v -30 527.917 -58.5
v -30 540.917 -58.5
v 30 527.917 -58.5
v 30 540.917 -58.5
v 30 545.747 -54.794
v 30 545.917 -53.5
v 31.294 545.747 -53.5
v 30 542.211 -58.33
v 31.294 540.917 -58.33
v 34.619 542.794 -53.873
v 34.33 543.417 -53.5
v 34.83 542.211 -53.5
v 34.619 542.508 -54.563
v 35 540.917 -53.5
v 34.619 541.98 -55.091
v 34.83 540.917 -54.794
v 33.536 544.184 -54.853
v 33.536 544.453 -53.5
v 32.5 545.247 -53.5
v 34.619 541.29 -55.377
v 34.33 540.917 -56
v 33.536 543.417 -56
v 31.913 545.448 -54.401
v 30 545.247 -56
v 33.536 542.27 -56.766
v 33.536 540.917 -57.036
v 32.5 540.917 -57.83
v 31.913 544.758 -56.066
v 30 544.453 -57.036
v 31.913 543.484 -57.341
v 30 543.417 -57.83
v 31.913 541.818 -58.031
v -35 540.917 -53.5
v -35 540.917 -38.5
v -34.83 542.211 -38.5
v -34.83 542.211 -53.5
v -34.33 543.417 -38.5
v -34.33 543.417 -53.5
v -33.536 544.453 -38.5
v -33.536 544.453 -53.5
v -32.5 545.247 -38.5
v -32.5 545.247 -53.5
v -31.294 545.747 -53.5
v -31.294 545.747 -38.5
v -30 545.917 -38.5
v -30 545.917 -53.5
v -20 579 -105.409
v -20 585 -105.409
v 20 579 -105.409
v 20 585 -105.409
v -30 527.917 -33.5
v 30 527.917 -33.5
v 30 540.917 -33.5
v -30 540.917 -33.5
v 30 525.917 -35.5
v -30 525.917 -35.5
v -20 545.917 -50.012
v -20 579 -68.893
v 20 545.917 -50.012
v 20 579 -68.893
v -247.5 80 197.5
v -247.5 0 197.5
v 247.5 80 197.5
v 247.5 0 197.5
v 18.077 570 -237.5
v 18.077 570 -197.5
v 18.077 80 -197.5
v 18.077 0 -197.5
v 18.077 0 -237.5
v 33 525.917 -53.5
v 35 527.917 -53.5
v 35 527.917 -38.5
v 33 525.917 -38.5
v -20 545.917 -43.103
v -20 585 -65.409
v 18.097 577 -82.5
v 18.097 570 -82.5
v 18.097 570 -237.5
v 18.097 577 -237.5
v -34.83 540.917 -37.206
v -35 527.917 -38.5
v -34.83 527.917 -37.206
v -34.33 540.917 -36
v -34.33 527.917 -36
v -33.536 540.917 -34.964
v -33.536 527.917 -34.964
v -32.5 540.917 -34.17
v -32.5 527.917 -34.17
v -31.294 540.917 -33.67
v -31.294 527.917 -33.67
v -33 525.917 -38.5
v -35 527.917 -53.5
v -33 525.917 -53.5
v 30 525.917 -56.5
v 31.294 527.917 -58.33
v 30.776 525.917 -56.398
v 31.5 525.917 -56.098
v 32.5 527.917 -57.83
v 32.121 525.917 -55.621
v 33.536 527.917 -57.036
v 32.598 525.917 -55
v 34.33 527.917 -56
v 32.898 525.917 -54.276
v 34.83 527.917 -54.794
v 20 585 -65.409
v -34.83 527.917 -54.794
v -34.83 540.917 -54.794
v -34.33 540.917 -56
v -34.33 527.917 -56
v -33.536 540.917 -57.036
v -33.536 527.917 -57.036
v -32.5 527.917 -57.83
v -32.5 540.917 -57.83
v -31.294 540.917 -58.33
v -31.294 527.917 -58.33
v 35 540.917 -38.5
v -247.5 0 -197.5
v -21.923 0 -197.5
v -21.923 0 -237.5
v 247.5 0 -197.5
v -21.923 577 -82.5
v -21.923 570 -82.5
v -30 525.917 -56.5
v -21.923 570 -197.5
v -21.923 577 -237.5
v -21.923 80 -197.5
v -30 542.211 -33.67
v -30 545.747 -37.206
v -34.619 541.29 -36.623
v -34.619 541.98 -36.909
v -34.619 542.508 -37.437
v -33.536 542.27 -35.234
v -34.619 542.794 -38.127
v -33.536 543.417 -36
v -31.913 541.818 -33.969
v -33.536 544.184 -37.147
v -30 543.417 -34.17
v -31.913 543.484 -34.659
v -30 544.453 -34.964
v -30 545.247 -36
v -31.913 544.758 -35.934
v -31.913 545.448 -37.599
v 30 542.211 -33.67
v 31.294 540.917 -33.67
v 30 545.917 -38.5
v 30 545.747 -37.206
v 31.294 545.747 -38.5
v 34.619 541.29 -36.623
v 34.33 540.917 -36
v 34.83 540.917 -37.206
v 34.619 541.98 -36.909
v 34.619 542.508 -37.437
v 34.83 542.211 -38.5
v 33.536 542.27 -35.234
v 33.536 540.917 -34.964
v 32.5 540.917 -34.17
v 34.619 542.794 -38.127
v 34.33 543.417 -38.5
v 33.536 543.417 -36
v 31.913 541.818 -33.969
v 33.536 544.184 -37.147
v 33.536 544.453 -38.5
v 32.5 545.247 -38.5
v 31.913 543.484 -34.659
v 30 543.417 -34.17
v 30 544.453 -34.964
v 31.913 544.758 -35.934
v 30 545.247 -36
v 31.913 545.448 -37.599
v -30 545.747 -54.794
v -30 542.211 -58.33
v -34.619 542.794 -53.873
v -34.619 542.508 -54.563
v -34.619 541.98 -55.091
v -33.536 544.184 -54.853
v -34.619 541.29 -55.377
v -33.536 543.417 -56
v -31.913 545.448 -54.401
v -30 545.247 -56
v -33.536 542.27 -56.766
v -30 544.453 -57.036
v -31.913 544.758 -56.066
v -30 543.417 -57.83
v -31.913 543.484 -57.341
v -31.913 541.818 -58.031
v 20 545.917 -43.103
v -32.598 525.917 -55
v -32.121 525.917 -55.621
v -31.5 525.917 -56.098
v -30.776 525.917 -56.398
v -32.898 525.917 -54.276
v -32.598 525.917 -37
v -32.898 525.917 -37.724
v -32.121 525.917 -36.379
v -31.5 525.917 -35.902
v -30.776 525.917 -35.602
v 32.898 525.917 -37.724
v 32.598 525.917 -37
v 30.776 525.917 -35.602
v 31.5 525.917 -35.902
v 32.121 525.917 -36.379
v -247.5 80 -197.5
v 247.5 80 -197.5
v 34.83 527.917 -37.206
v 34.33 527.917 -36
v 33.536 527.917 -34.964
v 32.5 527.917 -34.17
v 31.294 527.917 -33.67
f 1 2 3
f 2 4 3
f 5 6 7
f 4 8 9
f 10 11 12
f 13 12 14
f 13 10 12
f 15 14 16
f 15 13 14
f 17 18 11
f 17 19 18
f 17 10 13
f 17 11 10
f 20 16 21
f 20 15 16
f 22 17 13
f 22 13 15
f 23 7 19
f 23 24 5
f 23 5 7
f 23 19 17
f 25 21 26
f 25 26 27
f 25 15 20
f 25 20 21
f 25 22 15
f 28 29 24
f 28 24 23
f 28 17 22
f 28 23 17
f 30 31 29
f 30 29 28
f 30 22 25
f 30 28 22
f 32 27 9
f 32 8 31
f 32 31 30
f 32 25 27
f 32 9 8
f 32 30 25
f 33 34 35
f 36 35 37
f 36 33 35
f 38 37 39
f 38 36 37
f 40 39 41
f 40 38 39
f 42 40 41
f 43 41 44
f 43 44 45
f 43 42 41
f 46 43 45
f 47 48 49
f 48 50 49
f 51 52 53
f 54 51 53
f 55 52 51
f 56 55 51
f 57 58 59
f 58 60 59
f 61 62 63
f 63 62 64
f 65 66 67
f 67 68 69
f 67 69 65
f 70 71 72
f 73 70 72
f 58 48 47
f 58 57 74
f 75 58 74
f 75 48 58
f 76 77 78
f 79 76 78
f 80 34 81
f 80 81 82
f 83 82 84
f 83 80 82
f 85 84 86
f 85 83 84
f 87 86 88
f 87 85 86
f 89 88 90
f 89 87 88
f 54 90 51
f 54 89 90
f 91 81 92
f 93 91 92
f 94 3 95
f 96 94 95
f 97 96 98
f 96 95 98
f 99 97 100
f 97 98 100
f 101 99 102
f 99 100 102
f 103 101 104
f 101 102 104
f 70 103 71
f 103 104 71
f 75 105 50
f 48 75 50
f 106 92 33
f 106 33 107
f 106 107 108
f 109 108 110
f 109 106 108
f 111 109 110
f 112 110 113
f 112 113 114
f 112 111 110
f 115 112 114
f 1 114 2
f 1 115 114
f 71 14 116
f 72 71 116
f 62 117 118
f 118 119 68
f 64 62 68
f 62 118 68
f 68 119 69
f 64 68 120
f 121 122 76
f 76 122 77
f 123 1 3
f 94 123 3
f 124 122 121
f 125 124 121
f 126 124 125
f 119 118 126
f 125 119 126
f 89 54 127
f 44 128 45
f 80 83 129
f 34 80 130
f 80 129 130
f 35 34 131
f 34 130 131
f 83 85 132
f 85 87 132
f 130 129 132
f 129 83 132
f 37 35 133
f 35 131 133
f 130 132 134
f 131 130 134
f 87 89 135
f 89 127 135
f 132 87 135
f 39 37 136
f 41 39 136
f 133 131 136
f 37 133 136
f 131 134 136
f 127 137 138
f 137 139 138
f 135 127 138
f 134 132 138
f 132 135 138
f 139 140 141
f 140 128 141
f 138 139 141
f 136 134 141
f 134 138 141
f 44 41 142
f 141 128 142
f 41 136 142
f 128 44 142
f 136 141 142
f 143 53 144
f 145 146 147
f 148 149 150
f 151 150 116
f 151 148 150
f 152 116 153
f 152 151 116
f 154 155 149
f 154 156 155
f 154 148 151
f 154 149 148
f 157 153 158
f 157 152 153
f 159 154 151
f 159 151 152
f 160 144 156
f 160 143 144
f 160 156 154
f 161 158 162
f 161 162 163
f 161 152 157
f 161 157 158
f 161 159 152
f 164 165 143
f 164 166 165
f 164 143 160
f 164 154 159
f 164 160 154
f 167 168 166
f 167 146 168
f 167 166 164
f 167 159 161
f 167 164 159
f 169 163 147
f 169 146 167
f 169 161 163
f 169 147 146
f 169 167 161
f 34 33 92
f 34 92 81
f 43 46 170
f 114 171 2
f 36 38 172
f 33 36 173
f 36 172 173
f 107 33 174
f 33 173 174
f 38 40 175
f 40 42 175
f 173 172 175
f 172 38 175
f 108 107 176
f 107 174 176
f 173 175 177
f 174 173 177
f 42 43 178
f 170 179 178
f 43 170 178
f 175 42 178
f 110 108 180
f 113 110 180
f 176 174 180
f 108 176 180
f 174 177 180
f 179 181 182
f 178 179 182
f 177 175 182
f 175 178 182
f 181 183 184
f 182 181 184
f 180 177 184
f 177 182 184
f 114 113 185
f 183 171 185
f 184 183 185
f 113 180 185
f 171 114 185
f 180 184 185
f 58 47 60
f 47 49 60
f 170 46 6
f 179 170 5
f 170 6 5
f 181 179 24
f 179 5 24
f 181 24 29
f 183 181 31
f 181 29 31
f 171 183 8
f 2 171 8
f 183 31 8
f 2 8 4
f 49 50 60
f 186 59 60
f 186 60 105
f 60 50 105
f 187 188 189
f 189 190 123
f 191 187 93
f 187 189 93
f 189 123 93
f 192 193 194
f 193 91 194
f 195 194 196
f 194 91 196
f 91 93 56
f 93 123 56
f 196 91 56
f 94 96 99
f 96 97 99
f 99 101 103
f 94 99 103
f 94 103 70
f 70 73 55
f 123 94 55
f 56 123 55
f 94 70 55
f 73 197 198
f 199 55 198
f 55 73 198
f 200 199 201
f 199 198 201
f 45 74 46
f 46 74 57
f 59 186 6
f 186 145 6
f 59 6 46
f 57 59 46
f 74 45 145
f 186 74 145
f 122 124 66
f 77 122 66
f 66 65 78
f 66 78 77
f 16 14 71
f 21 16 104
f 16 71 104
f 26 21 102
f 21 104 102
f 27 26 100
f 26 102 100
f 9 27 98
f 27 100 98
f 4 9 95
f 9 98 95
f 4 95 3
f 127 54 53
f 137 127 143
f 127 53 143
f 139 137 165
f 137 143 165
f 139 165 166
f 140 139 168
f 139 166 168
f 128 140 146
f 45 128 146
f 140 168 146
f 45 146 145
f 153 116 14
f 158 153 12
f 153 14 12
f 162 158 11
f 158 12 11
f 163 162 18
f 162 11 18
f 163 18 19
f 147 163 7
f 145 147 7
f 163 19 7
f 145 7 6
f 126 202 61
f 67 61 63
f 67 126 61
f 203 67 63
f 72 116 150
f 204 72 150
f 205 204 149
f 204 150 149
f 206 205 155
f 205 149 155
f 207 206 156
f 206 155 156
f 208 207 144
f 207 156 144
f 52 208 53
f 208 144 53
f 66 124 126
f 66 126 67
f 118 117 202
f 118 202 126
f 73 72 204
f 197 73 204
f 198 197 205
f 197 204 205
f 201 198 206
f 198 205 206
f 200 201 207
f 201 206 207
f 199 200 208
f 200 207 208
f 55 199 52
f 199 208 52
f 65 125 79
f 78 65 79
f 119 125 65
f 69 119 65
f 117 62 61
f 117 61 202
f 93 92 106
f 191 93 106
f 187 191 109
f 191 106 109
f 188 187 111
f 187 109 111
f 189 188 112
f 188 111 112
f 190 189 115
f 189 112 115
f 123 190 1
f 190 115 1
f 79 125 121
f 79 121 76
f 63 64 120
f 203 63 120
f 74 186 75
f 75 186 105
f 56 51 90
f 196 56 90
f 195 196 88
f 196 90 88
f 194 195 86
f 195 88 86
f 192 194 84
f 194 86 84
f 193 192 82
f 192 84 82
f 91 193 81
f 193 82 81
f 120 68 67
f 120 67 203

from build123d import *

# Parameters (mm, degrees)
SKETCH1_W           = 495
SKETCH1_H           = 395
BOSS_EXTRUDE1_DEPTH = 80
SKETCH2_W           = 40
SKETCH2_H           = 40
BOSS_EXTRUDE2_DEPTH = 570
SKETCH3_W           = 40.020801558
SKETCH3_H           = 155
BOSS_EXTRUDE3_DEPTH = 7
BOSS_EXTRUDE4_DEPTH = 20
BOSS_EXTRUDE5_DEPTH = 35
FILLET1_R           = 5
CHAMFER1_SIZE       = 2


with BuildPart() as part:
    # Sketch1 → Boss-Extrude1 (new body)
    with BuildSketch(Plane(origin=(0, 0, 0), x_dir=(1, 0, 0), z_dir=(0, 1, 0))):
        Rectangle(SKETCH1_W, SKETCH1_H)
    extrude(amount=BOSS_EXTRUDE1_DEPTH)

    # Sketch2 → Boss-Extrude2 (add)
    with BuildSketch(Plane(origin=(0, 0, 0), x_dir=(1, 0, 0), z_dir=(0, 1, 0))):
        with Locations((-1.923445808, 217.5)):
            Rectangle(SKETCH2_W, SKETCH2_H)
    extrude(amount=BOSS_EXTRUDE2_DEPTH)

    # Sketch3 → Boss-Extrude3 (add)
    with BuildSketch(Plane(origin=(0, 570, 0), x_dir=(1, 0, 0), z_dir=(0, 1, 0))):
        with Locations((-1.913045029, 160)):
            Rectangle(SKETCH3_W, SKETCH3_H)
    extrude(amount=BOSS_EXTRUDE3_DEPTH)


with BuildPart() as body_2:
    # Sketch4 → Boss-Extrude4 (new, symmetric)
    with BuildSketch(Plane(origin=(0, 0, 0), x_dir=(0, 0, -1), z_dir=(1, 0, 0))):
        with BuildLine():
            Line((65.408745176, 585), (105.408745176, 585))
            Line((105.408745176, 585), (105.408745176, 579))
            Line((105.408745176, 579), (68.892810257, 579))
            Line((68.892810257, 579), (50.011654683, 545.91720855))
            Line((50.011654683, 545.91720855), (53.5, 545.91720855))
            ThreePointArc((53.5, 545.91720855), (57.035533906, 544.452742456), (58.5, 540.91720855))
            Line((58.5, 540.91720855), (58.5, 525.91720855))
            Line((58.5, 525.91720855), (33.5, 525.91720855))
            Line((33.5, 525.91720855), (33.5, 540.91720855))
            ThreePointArc((33.5, 540.91720855), (34.964466094, 544.452742456), (38.5, 545.91720855))
            Line((38.5, 545.91720855), (43.103243334, 545.91720855))
            Line((43.103243334, 545.91720855), (65.408745176, 585))
        make_face()
    extrude(amount=BOSS_EXTRUDE4_DEPTH, both=True)

    # Sketch5 → Boss-Extrude5 (add, symmetric)
    with BuildSketch(Plane(origin=(0, 0, 0), x_dir=(0, 0, -1), z_dir=(1, 0, 0))):
        with BuildLine():
            Line((58.5, 525.91720855), (33.5, 525.91720855))
            Line((33.5, 525.91720855), (33.5, 540.91720855))
            ThreePointArc((33.5, 540.91720855), (34.964466094, 544.452742456), (38.5, 545.91720855))
            Line((38.5, 545.91720855), (43.103243334, 545.91720855))
            Line((43.103243334, 545.91720855), (50.011654683, 545.91720855))
            Line((50.011654683, 545.91720855), (53.5, 545.91720855))
            ThreePointArc((53.5, 545.91720855), (57.035533906, 544.452742456), (58.5, 540.91720855))
            Line((58.5, 540.91720855), (58.5, 525.91720855))
        make_face()
    extrude(amount=BOSS_EXTRUDE5_DEPTH, both=True)

    # Fillet1
    fillet1_edges = [body_2.edges().sort_by_distance(p)[0] for p in [
        (-35, 533.41720855, -58.5),
        (-35, 544.452742456, -57.035533906),
        (-35, 545.91720855, -46),
        (-35, 544.452742456, -34.964466094),
        (-35, 533.41720855, -33.5),
        (35, 533.41720855, -58.5),
        (35, 544.452742456, -57.035533906),
        (35, 545.91720855, -46),
        (35, 544.452742456, -34.964466094),
        (35, 533.41720855, -33.5),
    ]]
    fillet(fillet1_edges, radius=FILLET1_R)

    # Chamfer1
    chamfer1_edges = [body_2.edges().sort_by_distance(p)[0] for p in [
        (0, 525.91720855, -33.5),
        (-35, 525.91720855, -46),
        (0, 525.91720855, -58.5),
        (35, 525.91720855, -46),
        (33.535533906, 525.91720855, -57.035533906),
        (-33.535533906, 525.91720855, -57.035533906),
        (33.535533906, 525.91720855, -34.964466094),
        (-33.535533906, 525.91720855, -34.964466094),
    ]]
    chamfer(chamfer1_edges, length=CHAMFER1_SIZE)


solid = Compound([part.part, body_2.part])
